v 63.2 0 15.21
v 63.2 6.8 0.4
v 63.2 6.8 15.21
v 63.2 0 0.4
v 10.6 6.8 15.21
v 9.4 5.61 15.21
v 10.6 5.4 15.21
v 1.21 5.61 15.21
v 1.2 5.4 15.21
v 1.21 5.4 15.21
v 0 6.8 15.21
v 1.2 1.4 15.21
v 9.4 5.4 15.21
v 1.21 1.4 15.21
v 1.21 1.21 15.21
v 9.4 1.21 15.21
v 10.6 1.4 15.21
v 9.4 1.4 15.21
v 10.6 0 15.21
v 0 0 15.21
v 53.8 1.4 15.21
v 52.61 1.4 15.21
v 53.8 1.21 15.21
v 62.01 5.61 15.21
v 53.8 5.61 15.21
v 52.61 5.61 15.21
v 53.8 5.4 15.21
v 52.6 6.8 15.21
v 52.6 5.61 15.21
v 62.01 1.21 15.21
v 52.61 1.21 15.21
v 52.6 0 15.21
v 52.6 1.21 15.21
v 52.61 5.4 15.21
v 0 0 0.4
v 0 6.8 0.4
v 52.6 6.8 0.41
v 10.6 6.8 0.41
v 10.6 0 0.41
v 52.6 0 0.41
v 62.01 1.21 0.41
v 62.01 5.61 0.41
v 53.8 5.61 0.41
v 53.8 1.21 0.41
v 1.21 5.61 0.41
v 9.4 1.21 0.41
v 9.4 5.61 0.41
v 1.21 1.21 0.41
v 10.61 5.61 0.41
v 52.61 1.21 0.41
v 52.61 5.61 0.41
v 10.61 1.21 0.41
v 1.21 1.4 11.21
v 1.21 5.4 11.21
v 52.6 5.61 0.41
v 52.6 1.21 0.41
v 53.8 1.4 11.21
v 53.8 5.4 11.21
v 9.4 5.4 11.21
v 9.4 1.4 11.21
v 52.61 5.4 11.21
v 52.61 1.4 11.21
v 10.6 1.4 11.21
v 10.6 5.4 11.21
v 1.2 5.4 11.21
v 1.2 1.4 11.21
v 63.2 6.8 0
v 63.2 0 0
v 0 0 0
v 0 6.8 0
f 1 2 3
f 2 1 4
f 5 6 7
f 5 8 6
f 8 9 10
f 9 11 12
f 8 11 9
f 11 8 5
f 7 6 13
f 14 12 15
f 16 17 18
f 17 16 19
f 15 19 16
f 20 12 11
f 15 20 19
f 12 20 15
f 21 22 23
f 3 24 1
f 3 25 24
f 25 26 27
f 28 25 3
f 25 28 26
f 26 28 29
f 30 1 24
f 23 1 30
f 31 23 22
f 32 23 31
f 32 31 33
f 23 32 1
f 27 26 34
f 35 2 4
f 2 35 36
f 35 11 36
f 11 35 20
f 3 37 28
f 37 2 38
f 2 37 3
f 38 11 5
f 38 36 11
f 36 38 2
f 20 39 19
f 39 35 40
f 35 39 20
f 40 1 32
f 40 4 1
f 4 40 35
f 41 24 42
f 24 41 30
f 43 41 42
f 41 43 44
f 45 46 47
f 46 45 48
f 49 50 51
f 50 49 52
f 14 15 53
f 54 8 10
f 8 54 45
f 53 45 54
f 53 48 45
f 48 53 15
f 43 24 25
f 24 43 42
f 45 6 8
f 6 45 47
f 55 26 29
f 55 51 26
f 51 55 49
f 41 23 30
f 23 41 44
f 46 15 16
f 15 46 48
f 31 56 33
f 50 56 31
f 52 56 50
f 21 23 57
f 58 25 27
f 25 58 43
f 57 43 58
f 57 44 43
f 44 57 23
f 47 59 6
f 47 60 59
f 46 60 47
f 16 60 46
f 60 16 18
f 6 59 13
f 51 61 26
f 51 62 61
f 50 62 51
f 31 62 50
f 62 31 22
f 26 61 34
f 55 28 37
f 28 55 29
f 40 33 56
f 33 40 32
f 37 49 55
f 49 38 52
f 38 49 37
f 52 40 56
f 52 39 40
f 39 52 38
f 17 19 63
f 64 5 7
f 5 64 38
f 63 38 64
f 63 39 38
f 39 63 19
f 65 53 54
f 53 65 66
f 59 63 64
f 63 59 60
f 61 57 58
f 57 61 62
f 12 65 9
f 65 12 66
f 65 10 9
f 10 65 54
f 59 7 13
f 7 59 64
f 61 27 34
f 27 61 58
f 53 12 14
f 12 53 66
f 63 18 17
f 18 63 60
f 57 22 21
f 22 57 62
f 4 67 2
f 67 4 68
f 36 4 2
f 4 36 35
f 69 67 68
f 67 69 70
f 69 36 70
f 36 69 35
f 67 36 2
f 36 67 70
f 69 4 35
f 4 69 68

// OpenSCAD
// file: ../../Base/Rotation.scad
// Fischertechnik Box Foundation
// Geometry Helpers Rotation

include <PlacementOptions.scad>

// getRotatedSpace(space, rotation=NoRotation)
// Rotates the space dependent on the specified rotation

function getRotatedSpace(space, rotation=NoRotation) = [
    (rotation == Rotate90 || rotation == Rotate270) ? space.y : space.x,
    (rotation == Rotate90 || rotation == Rotate270) ? space.x : space.y
];

// Rotates the given space around the fixed left lower corner
// space = the space the children needs as width/depth list [width,depth]
// rotation = 0 Rotate0 degrees, 1 Rotate90 degrees, 2 Rotate180 degrees, 3 Rotate270 degrees (equivalent to -90)

module RotateFix(space, rotation=NoRotation) {
    dy = (rotation == Rotate0 || rotation == Rotate270) ? 0 :
        (rotation == Rotate90) ? space.x :
        space.y;
    dx = (rotation < Rotate180) ? 0 :
        (rotation == Rotate180) ? space.x :
        space.y;
    
    translate([dx, dy, 0])
        rotate([0, 0, rotations[rotation]])
            children();
}
// file: ../../Base/Alignment.scad
// Fischertechnik Box Foundation
// Geometry Helpers Alignment

include <PlacementOptions.scad>

// getAlignedX(elementWidth, spaceWidth, align=AlignRight, offset=0)
// Gets the aligned X offset of an element with the given
// width in the given space.
// elementWidth = The width of the element to positon
// spaceWidth = The space where the element should be aligned
// align = 0 AlignLeft, 1 AlignCenter, 2 AlignRight
// offset = an optional offset from the aligned position. When
// aligned left or centered, then positive values are in X direction.
// When aligned right then positive values are in negative X direction.

function getAlignedX(elementWidth, spaceWidth, align=AlignRight, offset=0) =
    (align == AlignLeft) ?
        offset :
        ((align == AlignCenter) ?
        (spaceWidth - elementWidth)/2 + offset :
        spaceWidth - offset - elementWidth);

// getAlignedY(elementDepth, spaceDepth, align=AlignTop, offset=0)
// Gets the aligned Y offset of an element with the given
// depth in the given space.
// elementDepth = The depth of the element to positon
// spaceDepth = The space where the element should be aligned
// align = 0 AlignBottom, 1 AlignCenter, 2 AlignTop
// offset = an optional offset from the aligned position. When
// aligned bottom or centered, then positive values are in Y direction.
// When aligned top then positive values are in negative Y direction.

function getAlignedY(elementDepth, spaceDepth, align=AlignTop, offset=0) =
    (align == AlignBottom) ?
        offset :
        ((align == AlignCenter) ?
        (spaceDepth - elementDepth)/2 + offset :
        spaceDepth - offset - elementDepth);
// file: ../../Base/Boxes.scad
// Fischertechnik Box Foundation
// Pre-designed Boxes

use <Constants.scad>

include <PlacementOptions.scad>

box190Width = 190;
box190Depth = 130;
box130Width = 130;
box130Depth = 95;

// Values are from an original ec3 box
topBottomDifference = 1.5;
outerHeight = 40;
innerHeight = 38.2;
baseThickness = outerHeight - innerHeight;
stackExcess = 5.7;
radius = 3.5;
wallThickness = 1.5;
tolerance = 0.2;
stackOffset = innerHeight - stackExcess;

boxUsageHeight = stackOffset;
boxWallThickness = wallThickness;
boxBaseThickness = baseThickness;
boxWebWidth = 3.0;

// getBoxWallThickness()
// Gets the wall thickness of a Fischertechnik Box
function getBoxWallThickness() = boxWallThickness;

// getBoxUsageHeight()
// Gets the usable height of a Fischertechnik box
function getBoxUsageHeight() = boxUsageHeight;

// getBoxInnerHeight()
// Gets the inner height of a Fischertechnik box, including the stack excess
function getBoxInnerHeight() = innerHeight;

// getBoxBaseThickness()
// Gets the thickness of the Fischertechnik box base.
function getBoxBaseThickness() = boxBaseThickness;

// getBoxWebWidth()
// Gets the width of a box web
function getBoxWebWidth() = boxWebWidth;

// getBox190Space()
// Gets the usable inner space of a Box 190 as an x/y-list
function getBox190Space() = [
    box190Width - 2*getBoxWallThickness() - topBottomDifference, 
    box190Depth - 2*getBoxWallThickness() - topBottomDifference ];

// BoxBase(width, depth)
// Creates an empty stackable Fischertechnik compatible box
// width = Outer width of the box (190, 130, ...)
// depth = Outer depth of the box (130, 95, ...)

module BoxBase(width, depth, height=outerHeight) {    
    thinPlate = 0.01;

    innerHeight = height - baseThickness;    
    
    module BodyPlate(width, depth) {
        translate([radius, radius])
        hull() {
            w = width-2*radius;
            d = depth-2*radius;
            cube([w, d, thinPlate]);
            cylinder(thinPlate, r=radius, $fn=getFragments());
            translate([w, 0])
                cylinder(thinPlate, r=radius, $fn=getFragments());
            translate([w, d])
                cylinder(thinPlate, r=radius, $fn=getFragments());
            translate([0, d])
                cylinder(thinPlate, r=radius, $fn=getFragments());
        }
    }
    
    module Body(tolerance=tolerance) {
        hull() {
            // Bottom with tolerance to fit into the original boxes when stacked
            translate([-wallThickness+tolerance, -wallThickness+tolerance, -baseThickness])
                BodyPlate(width-topBottomDifference-2*tolerance, depth-topBottomDifference-2*tolerance);
            
            // Top
            translate([-wallThickness-topBottomDifference/2, -wallThickness-topBottomDifference/2, innerHeight-thinPlate])
                BodyPlate(width, depth);
         }
    }

    module Cutoff() {
        hull() {
            coWidth = width - 2*wallThickness;
            coDepth = depth - 2*wallThickness;
            
            // Bottom
            BodyPlate(coWidth-topBottomDifference, coDepth-topBottomDifference);

            // Top
            translate([-topBottomDifference/2, -topBottomDifference/2, innerHeight+thinPlate]) 
                BodyPlate(coWidth, coDepth);
        }
    }
    
    difference() {        
        Body();
        Cutoff();
        stackOffset = innerHeight - stackExcess;
        translate([0, 0, stackOffset + baseThickness])
            Body(tolerance=0);
    }
}

// Creates the Fischertechnik empty box 130x190 mm and places it at position 0,0
// 190x130 are the outer sizes, the inner space is slightly smaller. Use getBox190Space() to get the inner sizes.
// The box is positioned that the usable inner space is at the 0,0,0 position. The

module Box190() {
    BoxBase(box190Width, box190Depth);
}

// Gets the usable inner space of a Box 130 as an x/y-list
function getBox130Space() = [
    box130Width - 2*getBoxWallThickness() - topBottomDifference, 
    box130Depth - 2*getBoxWallThickness() - topBottomDifference ];

// Creates the Fischertechnik empty box 95x130 mm and places it at position 0,0
// 190x130 are the outer sizes, the inner space is slightly smaller. Use getBox190Space() to get the inner sizes.
// The box is positioned that the usable inner space is at the 0,0,0 position. The

module Box130() {
    BoxBase(box130Width, box130Depth);
}

// Creates a web at the specified box walls
// corner 0 = LowerLeft, 1 = UpperLeft, 2 = UpperRight, 3 = LowerRight
// side 0 = LeftOfCorner, 1 = RightOfCorner
// distance = Distance in mm from the corner
// boxSpace = inner width and depth of the box (default: Box 190)
// webWidth = length of the web (default is 3 mms)
// webThickness = thickness of the web (default is 1 mm)

module BoxWeb(corner, side, distance, boxSpace=getBox190Space(), webWidth=getBoxWebWidth(), webThickness=1.0) {
    sink = getBoxWallThickness()/2;

    width = (corner % 2 == 0) ? 
            (side == LeftOfCorner ? webWidth : webThickness) :
            (side == LeftOfCorner ? webThickness : webWidth);

    depth = (corner % 2 == 0) ? 
            (side == RightOfCorner ? webWidth : webThickness) :
            (side == RightOfCorner ? webThickness : webWidth);
    
    xDiff = corner == LowerLeft ? 
                (side == LeftOfCorner ? -sink : distance) :
            (corner == UpperLeft ?                
                (side == LeftOfCorner ? distance : -sink) :
            (corner == UpperRight ?
                (side == LeftOfCorner ? boxSpace.x-webWidth+sink : boxSpace.x-distance-webThickness) :
                (side == LeftOfCorner ? boxSpace.x-distance-webThickness: boxSpace.x-webWidth+sink)));

    yDiff = corner == LowerLeft ? 
                (side == RightOfCorner ? -sink : distance) :
            (corner == UpperLeft ?
                (side == RightOfCorner ? boxSpace.y-distance : boxSpace.y-webWidth+sink) :
            (corner == UpperRight ?
                (side == RightOfCorner ? boxSpace.y-webWidth+sink : boxSpace.y-distance) :
                (side == RightOfCorner ? distance : -sink)));
    
    translate([xDiff, yDiff, -getExcess()])
        cube([width, depth, boxUsageHeight + 2*getExcess()]);
}
// file: ../../Base/PlacementOptions.scad
// Fischertechnik Box Foundation
// Placement Options

// Alignment
NoAlign = 0;
AlignLeft = 1;
AlignBottom = 2;
AlignCenter = 3;
AlignRight = 4;
AlignTop = 5;

// Element rotation degree steps
rotations = [0, -90, -180, -270];

// Rotation
NoRotation = 0;
Rotate0 = 0;
Rotate90 = 1;
Rotate180 = 2;
Rotate270 = 3;

// Docking (seen from above)
NoDock = -1;
DockLeft = 0;
DockTop = 1;
DockRight = 2;
DockCorner = 2;
DockBottom = 3;

// Web corners
LowerLeft = 0;
UpperLeft = 1;
UpperRight = 2;
LowerRight = 3;

// Web position relative to corner
LeftOfCorner = 0;
RightOfCorner = 1;
// file: ../../Base/Placement.scad
// Fischertechnik Box Foundation
// Geometry Helpers Placement

use <Constants.scad>
use <Alignment.scad>
use <Rotation.scad>
use <Boxes.scad>

include <PlacementOptions.scad>

// Place(x=0, y=0, elementSpace=[0,0], alignX=AlignLeft, alignY=AlignBottom, rotation=Rotate0, boxSpace=getBox190Space())
// Places the child at the specified position
// y = Y-Position. This is a relative position when an X aligment is specified.
// x = X-Position. This is a relative position when an Y aligment is specified.
// elementSpace = space of the element to be placed [x,y]
// alignX = -1=NoAlign, 0 AlignLeft, 1 AlignCenter, 3 AlignRight (elementSpace and boxSpace required!)
// alignY = -1=NoAlign, 2 AlignBottom, 1 AlignCenter, 4 AlignTop (elementSpace and boxSpace required!)
// rotation = 0 Rotate0 0 degrees, 1 Rotate90 90 degrees, 
// 2 Rotate180 180 degrees, 3 Rotate270 270 degrees (equivalent to -90)
// boxSpace = Inner space of the box where the placement occurs [x,y] - default is Box 190x130 inner space

module Place(x=0, y=0, elementSpace=[0,0], 
  alignX=AlignLeft, alignY=AlignBottom, 
  rotation=NoRotation, boxSpace=getBox190Space()) {

    module Position(x, y, space, rotation=Rotate0) {
        translate([x, y, 0])
            RotateFix(space, rotation)
                children();
    }

    space = getRotatedSpace(elementSpace, rotation);
    alignedX = getAlignedX(space.x, boxSpace.x, alignX, x);
    alignedY = getAlignedY(space.y, boxSpace.y, alignY, y);
    Position(alignedX, alignedY, elementSpace, rotation)
        children();
}

// Center(space=getBox130Space(), elementSpace=[0,0])
// space = Space where the children is centered. For cylinder use centered=true and no elementSpace.
// elementSpace = space of the element to be centered [x,y]

module Center(space=getBox190Space(), elementSpace=[0,0]) {
    Place(elementSpace=elementSpace, boxSpace=space, alignX=AlignCenter, alignY=AlignCenter)
        children();
}

// CenterHorizontal(width=0, y=0, offset=0, space=getBox130Space())
// width = Width of the element to be placed.
// y = Y position of the element
// offset = Offset from the center position (negative will be left of the center)
// space = Space where the element is placed

module CenterHorizontal(width=0, y=0, offset=0, space=getBox190Space()) {
    Place(x=offset, y=y, elementSpace=[width, 0], boxSpace=space, alignX=AlignCenter)
        children(0);
}

// CenterVertical(depth=0, x=0, offset=0, space=getBox130Space())
// depth = Depth of the element to be placed.
// x = X position of the element
// offset = Offset from the center position (negative will be down of the center)
// space = Space where the element is placed

module CenterVertical(depth=0, x=0, offset=0, space=getBox190Space()) {
    Place(x=x, y=offset, elementSpace=[0, depth], boxSpace=space, alignY=AlignCenter)
        children(0);
}

// getIsVertical(align)
// True if the specified alignment needs a vertical orientation for a divider (AlignRight, AlignLeft)

function getIsVertical(align) = (align == AlignRight || align == AlignLeft);

// getIsHorizontal(align)
// True if the specified alignment needs a horizontal orientation for a divider (AlignTop, AlignBottom)

function getIsHorizontal(align) = (align == AlignTop || align == AlignBottom);
// file: ../../Elements/AxisClip10.scad
// Fischertechnik Box Library
// Axis for clip 10
// 31023

use <../ModelBase/Simple.scad>
use <../Base/Constants.scad>

width = 12;
depth = 12;
height = 23;
upperDiameter = 3.6;
clipHeight = 10;

// getAxisClip10Space()
// Gets the space of a frame for a clip 10 with spring ring (mot2)

function getAxisClip10Space() = [width, depth, height];

// AxisClip10(height, clipHeight)
// Axis for clip 10 with spring ring (mot2)
// height = Height of the complete axis
// clipHeight = Height of the rt for the clip (standard is 10, in mot3 its only 7)

module AxisClip10(height=height, clipHeight=clipHeight) {
    LeveledAxisWithSpace(height, height-clipHeight, getAxisClip10Space(), diameter=upperDiameter);
}

// Tests
color("lightgray")
AxisClip10();
// file: ../../Base/Constants.scad
// Fischertechnik Box Foundation
// Constants

// Constant values necessary for multiple elements

// Base constants
dividerThickness = 1.2;
excess = 0.01;
fragments = 90;
tolerance = 0.8;

// Gets the thickness of a divider 
function getDividerThickness() = dividerThickness;

// Gets the excess that is used to merge walls into each other
function getExcess() = excess;

// Gets amount of fragments of a cylinder
function getFragments() = fragments;

// Gets the inner tolerance of a frame to each side
function getTolerance() = tolerance;


// Fischertechnik specific constants
axisDiameter = 4;
axisBottomDiameter = axisDiameter + 1;
standardEdgeDistance = 2.5;
standardWebDistance = 11.5;
standardCornerLength = 15;
tubeWallFactor = 0.8;
smallPartsFrameHeight = 20;

// Gets axis diameter
function getAxisDiameter() = axisDiameter;

// Gets axis bottom diameter for thicker part at the bottom
function getAxisBottomDiameter() = axisBottomDiameter;

// gets the standard distance to the wall of the box for dockable frames with webs
function getStandardEdgeDistance() = standardEdgeDistance;

// gets the standard distance of each web to the corner of the dockable frame
function getStandardWebDistance() = standardWebDistance;

// gets the standard length of the corner walls of a dockable frame
function getStandardCornerLength() = standardCornerLength;

// gets the wall thickness of a tube.
function getTubeWallThickness() = tubeWallFactor * getDividerThickness();

// gets the frame height for docked small parts boxes.
function getSmallPartsFrameHeight() = smallPartsFrameHeight;
// file: ../../Elements/FrameAxis60.scad
// Fischertechnik Box Library
// Frame for single 60 mm Axis
// 31032

use <../ModelBase/Complex.scad>

length = 60;

// getFrameAxis60Space()
// Gets the width (.x) and depth (.y) of the axis frame.

function getFrameAxis60Space() = getFrameAxisSpace(length);

// FrameAxis60()
// Axis holder for a single 60 mm axis.

module FrameAxis60() {
    FrameAxis(length);
}

// Test
color("lightgray")
FrameAxis60();
// file: ../TestPrint.scad
// 3D Print Test Base

use <../Base/Constants.scad>

use <../Elements/AxisClip10.scad>

module TestPrint(elementSpace) {
    cube([elementSpace.x, elementSpace.y, 0.4]);
    translate([0,0,0.4+getExcess()]) {
        children();
    }
}

TestPrint(getAxisClip10Space())
    AxisClip10();
// main file
// 3D Print Test
// FrameAxis60

use <../TestPrint.scad>
use <../../Elements/FrameAxis60.scad>

TestPrint(getFrameAxis60Space())
    FrameAxis60();
